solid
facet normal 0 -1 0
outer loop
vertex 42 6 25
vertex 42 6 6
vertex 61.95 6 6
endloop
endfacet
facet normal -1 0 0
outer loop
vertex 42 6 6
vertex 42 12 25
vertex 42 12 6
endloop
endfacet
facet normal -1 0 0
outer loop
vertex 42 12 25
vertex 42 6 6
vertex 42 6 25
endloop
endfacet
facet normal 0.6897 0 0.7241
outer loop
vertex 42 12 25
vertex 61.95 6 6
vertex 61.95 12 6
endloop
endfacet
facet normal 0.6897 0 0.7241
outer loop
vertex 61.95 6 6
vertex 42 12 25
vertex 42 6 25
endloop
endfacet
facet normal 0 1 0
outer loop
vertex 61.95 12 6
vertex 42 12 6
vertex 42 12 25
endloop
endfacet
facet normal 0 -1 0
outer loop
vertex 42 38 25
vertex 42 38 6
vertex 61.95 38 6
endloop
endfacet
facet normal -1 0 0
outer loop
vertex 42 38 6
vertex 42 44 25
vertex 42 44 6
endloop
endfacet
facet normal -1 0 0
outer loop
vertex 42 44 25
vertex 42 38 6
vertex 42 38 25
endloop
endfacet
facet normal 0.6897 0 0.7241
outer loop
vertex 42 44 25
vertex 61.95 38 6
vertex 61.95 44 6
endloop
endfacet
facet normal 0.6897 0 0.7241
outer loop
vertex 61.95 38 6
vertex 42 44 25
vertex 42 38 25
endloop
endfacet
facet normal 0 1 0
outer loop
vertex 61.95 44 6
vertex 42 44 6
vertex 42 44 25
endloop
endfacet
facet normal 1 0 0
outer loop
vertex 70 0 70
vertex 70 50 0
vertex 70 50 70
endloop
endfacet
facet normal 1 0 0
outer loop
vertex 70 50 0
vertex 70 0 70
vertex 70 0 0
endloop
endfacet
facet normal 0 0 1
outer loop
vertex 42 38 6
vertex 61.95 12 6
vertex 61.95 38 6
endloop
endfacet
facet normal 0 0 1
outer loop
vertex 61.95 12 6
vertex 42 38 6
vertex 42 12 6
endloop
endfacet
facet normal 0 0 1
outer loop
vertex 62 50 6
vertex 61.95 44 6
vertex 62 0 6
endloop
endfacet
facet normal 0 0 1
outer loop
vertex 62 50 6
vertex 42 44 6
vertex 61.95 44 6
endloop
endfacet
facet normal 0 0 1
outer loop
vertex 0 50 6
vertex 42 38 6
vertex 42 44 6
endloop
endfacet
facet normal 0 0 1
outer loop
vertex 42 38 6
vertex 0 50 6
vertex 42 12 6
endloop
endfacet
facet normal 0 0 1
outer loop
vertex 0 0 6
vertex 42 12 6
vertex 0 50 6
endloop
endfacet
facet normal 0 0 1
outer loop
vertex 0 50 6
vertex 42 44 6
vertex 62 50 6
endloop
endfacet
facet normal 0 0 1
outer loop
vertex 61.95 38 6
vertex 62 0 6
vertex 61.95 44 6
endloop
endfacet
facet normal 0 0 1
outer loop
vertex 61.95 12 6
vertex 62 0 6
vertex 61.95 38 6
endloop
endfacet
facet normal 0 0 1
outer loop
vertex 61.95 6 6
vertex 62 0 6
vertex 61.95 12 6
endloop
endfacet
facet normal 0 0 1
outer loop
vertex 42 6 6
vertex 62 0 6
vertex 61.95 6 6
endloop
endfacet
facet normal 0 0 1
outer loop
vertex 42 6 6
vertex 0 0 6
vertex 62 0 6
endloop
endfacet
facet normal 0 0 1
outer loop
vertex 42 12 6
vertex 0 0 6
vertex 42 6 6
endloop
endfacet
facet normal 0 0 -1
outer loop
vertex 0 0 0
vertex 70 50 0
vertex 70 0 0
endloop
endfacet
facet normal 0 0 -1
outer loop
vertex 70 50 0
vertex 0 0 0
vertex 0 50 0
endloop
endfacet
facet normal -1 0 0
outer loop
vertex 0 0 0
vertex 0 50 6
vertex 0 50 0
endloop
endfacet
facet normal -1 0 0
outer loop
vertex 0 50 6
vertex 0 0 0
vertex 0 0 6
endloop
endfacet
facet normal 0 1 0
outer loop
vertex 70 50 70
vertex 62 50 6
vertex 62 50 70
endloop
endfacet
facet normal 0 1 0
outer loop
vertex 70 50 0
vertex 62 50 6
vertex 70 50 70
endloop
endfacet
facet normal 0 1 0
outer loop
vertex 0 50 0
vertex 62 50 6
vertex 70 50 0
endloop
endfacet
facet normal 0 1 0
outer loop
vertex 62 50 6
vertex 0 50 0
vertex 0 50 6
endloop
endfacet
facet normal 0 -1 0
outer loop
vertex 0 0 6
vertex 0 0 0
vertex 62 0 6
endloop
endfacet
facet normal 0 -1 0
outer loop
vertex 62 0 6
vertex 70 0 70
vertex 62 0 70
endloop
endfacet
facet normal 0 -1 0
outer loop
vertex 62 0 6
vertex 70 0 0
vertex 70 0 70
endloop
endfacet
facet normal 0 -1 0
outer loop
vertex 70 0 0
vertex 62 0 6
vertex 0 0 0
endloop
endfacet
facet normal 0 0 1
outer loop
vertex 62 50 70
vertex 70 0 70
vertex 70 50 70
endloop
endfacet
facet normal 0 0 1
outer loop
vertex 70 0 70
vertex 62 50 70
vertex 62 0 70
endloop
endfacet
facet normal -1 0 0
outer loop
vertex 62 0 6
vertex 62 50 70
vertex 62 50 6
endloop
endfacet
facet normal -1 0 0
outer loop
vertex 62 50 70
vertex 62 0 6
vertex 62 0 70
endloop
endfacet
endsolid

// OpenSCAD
$fn = 32;

// ----------------------------------------------------------------------
// Rib bracket: 2-gusset L bracket
// ----------------------------------------------------------------------

// --- parameters (mm) ---
base_l = 70;              // foot length, X
base_w = 50;              // foot width, Y
base_t = 6;               // foot thickness
plate_t = 8;              // upright plate thickness
plate_h = 70;             // overall height
gus_l = 20;               // gusset leg along the foot
gus_h = 20;               // gusset height
gus_t = 6;                // gusset thickness
gus_edge = 6;             // gusset margin from the foot edge
n_gus = 2;                // gusset count
fit_tol = 0.1;            // tolerance for press fits, mm
free_tol = 0.3;           // tolerance for clearance fits, mm

gus_pitch = (base_w - 2 * gus_edge - gus_t) / (n_gus - 1);  // gusset pitch

union() {
  cube([base_l, base_w, base_t]);
  translate([base_l - plate_t, 0, base_t - 1])
    cube([plate_t, base_w, plate_h - base_t + 1]);
  for (i = [0 : n_gus - 1])
    translate([base_l - plate_t - gus_l, gus_edge + i * gus_pitch, base_t - 1])
      rotate([-90, 0, 0])
        linear_extrude(height = gus_t)
          polygon(points = [[0, 0], [gus_l + 1, 0], [0, -gus_h]]);
}
